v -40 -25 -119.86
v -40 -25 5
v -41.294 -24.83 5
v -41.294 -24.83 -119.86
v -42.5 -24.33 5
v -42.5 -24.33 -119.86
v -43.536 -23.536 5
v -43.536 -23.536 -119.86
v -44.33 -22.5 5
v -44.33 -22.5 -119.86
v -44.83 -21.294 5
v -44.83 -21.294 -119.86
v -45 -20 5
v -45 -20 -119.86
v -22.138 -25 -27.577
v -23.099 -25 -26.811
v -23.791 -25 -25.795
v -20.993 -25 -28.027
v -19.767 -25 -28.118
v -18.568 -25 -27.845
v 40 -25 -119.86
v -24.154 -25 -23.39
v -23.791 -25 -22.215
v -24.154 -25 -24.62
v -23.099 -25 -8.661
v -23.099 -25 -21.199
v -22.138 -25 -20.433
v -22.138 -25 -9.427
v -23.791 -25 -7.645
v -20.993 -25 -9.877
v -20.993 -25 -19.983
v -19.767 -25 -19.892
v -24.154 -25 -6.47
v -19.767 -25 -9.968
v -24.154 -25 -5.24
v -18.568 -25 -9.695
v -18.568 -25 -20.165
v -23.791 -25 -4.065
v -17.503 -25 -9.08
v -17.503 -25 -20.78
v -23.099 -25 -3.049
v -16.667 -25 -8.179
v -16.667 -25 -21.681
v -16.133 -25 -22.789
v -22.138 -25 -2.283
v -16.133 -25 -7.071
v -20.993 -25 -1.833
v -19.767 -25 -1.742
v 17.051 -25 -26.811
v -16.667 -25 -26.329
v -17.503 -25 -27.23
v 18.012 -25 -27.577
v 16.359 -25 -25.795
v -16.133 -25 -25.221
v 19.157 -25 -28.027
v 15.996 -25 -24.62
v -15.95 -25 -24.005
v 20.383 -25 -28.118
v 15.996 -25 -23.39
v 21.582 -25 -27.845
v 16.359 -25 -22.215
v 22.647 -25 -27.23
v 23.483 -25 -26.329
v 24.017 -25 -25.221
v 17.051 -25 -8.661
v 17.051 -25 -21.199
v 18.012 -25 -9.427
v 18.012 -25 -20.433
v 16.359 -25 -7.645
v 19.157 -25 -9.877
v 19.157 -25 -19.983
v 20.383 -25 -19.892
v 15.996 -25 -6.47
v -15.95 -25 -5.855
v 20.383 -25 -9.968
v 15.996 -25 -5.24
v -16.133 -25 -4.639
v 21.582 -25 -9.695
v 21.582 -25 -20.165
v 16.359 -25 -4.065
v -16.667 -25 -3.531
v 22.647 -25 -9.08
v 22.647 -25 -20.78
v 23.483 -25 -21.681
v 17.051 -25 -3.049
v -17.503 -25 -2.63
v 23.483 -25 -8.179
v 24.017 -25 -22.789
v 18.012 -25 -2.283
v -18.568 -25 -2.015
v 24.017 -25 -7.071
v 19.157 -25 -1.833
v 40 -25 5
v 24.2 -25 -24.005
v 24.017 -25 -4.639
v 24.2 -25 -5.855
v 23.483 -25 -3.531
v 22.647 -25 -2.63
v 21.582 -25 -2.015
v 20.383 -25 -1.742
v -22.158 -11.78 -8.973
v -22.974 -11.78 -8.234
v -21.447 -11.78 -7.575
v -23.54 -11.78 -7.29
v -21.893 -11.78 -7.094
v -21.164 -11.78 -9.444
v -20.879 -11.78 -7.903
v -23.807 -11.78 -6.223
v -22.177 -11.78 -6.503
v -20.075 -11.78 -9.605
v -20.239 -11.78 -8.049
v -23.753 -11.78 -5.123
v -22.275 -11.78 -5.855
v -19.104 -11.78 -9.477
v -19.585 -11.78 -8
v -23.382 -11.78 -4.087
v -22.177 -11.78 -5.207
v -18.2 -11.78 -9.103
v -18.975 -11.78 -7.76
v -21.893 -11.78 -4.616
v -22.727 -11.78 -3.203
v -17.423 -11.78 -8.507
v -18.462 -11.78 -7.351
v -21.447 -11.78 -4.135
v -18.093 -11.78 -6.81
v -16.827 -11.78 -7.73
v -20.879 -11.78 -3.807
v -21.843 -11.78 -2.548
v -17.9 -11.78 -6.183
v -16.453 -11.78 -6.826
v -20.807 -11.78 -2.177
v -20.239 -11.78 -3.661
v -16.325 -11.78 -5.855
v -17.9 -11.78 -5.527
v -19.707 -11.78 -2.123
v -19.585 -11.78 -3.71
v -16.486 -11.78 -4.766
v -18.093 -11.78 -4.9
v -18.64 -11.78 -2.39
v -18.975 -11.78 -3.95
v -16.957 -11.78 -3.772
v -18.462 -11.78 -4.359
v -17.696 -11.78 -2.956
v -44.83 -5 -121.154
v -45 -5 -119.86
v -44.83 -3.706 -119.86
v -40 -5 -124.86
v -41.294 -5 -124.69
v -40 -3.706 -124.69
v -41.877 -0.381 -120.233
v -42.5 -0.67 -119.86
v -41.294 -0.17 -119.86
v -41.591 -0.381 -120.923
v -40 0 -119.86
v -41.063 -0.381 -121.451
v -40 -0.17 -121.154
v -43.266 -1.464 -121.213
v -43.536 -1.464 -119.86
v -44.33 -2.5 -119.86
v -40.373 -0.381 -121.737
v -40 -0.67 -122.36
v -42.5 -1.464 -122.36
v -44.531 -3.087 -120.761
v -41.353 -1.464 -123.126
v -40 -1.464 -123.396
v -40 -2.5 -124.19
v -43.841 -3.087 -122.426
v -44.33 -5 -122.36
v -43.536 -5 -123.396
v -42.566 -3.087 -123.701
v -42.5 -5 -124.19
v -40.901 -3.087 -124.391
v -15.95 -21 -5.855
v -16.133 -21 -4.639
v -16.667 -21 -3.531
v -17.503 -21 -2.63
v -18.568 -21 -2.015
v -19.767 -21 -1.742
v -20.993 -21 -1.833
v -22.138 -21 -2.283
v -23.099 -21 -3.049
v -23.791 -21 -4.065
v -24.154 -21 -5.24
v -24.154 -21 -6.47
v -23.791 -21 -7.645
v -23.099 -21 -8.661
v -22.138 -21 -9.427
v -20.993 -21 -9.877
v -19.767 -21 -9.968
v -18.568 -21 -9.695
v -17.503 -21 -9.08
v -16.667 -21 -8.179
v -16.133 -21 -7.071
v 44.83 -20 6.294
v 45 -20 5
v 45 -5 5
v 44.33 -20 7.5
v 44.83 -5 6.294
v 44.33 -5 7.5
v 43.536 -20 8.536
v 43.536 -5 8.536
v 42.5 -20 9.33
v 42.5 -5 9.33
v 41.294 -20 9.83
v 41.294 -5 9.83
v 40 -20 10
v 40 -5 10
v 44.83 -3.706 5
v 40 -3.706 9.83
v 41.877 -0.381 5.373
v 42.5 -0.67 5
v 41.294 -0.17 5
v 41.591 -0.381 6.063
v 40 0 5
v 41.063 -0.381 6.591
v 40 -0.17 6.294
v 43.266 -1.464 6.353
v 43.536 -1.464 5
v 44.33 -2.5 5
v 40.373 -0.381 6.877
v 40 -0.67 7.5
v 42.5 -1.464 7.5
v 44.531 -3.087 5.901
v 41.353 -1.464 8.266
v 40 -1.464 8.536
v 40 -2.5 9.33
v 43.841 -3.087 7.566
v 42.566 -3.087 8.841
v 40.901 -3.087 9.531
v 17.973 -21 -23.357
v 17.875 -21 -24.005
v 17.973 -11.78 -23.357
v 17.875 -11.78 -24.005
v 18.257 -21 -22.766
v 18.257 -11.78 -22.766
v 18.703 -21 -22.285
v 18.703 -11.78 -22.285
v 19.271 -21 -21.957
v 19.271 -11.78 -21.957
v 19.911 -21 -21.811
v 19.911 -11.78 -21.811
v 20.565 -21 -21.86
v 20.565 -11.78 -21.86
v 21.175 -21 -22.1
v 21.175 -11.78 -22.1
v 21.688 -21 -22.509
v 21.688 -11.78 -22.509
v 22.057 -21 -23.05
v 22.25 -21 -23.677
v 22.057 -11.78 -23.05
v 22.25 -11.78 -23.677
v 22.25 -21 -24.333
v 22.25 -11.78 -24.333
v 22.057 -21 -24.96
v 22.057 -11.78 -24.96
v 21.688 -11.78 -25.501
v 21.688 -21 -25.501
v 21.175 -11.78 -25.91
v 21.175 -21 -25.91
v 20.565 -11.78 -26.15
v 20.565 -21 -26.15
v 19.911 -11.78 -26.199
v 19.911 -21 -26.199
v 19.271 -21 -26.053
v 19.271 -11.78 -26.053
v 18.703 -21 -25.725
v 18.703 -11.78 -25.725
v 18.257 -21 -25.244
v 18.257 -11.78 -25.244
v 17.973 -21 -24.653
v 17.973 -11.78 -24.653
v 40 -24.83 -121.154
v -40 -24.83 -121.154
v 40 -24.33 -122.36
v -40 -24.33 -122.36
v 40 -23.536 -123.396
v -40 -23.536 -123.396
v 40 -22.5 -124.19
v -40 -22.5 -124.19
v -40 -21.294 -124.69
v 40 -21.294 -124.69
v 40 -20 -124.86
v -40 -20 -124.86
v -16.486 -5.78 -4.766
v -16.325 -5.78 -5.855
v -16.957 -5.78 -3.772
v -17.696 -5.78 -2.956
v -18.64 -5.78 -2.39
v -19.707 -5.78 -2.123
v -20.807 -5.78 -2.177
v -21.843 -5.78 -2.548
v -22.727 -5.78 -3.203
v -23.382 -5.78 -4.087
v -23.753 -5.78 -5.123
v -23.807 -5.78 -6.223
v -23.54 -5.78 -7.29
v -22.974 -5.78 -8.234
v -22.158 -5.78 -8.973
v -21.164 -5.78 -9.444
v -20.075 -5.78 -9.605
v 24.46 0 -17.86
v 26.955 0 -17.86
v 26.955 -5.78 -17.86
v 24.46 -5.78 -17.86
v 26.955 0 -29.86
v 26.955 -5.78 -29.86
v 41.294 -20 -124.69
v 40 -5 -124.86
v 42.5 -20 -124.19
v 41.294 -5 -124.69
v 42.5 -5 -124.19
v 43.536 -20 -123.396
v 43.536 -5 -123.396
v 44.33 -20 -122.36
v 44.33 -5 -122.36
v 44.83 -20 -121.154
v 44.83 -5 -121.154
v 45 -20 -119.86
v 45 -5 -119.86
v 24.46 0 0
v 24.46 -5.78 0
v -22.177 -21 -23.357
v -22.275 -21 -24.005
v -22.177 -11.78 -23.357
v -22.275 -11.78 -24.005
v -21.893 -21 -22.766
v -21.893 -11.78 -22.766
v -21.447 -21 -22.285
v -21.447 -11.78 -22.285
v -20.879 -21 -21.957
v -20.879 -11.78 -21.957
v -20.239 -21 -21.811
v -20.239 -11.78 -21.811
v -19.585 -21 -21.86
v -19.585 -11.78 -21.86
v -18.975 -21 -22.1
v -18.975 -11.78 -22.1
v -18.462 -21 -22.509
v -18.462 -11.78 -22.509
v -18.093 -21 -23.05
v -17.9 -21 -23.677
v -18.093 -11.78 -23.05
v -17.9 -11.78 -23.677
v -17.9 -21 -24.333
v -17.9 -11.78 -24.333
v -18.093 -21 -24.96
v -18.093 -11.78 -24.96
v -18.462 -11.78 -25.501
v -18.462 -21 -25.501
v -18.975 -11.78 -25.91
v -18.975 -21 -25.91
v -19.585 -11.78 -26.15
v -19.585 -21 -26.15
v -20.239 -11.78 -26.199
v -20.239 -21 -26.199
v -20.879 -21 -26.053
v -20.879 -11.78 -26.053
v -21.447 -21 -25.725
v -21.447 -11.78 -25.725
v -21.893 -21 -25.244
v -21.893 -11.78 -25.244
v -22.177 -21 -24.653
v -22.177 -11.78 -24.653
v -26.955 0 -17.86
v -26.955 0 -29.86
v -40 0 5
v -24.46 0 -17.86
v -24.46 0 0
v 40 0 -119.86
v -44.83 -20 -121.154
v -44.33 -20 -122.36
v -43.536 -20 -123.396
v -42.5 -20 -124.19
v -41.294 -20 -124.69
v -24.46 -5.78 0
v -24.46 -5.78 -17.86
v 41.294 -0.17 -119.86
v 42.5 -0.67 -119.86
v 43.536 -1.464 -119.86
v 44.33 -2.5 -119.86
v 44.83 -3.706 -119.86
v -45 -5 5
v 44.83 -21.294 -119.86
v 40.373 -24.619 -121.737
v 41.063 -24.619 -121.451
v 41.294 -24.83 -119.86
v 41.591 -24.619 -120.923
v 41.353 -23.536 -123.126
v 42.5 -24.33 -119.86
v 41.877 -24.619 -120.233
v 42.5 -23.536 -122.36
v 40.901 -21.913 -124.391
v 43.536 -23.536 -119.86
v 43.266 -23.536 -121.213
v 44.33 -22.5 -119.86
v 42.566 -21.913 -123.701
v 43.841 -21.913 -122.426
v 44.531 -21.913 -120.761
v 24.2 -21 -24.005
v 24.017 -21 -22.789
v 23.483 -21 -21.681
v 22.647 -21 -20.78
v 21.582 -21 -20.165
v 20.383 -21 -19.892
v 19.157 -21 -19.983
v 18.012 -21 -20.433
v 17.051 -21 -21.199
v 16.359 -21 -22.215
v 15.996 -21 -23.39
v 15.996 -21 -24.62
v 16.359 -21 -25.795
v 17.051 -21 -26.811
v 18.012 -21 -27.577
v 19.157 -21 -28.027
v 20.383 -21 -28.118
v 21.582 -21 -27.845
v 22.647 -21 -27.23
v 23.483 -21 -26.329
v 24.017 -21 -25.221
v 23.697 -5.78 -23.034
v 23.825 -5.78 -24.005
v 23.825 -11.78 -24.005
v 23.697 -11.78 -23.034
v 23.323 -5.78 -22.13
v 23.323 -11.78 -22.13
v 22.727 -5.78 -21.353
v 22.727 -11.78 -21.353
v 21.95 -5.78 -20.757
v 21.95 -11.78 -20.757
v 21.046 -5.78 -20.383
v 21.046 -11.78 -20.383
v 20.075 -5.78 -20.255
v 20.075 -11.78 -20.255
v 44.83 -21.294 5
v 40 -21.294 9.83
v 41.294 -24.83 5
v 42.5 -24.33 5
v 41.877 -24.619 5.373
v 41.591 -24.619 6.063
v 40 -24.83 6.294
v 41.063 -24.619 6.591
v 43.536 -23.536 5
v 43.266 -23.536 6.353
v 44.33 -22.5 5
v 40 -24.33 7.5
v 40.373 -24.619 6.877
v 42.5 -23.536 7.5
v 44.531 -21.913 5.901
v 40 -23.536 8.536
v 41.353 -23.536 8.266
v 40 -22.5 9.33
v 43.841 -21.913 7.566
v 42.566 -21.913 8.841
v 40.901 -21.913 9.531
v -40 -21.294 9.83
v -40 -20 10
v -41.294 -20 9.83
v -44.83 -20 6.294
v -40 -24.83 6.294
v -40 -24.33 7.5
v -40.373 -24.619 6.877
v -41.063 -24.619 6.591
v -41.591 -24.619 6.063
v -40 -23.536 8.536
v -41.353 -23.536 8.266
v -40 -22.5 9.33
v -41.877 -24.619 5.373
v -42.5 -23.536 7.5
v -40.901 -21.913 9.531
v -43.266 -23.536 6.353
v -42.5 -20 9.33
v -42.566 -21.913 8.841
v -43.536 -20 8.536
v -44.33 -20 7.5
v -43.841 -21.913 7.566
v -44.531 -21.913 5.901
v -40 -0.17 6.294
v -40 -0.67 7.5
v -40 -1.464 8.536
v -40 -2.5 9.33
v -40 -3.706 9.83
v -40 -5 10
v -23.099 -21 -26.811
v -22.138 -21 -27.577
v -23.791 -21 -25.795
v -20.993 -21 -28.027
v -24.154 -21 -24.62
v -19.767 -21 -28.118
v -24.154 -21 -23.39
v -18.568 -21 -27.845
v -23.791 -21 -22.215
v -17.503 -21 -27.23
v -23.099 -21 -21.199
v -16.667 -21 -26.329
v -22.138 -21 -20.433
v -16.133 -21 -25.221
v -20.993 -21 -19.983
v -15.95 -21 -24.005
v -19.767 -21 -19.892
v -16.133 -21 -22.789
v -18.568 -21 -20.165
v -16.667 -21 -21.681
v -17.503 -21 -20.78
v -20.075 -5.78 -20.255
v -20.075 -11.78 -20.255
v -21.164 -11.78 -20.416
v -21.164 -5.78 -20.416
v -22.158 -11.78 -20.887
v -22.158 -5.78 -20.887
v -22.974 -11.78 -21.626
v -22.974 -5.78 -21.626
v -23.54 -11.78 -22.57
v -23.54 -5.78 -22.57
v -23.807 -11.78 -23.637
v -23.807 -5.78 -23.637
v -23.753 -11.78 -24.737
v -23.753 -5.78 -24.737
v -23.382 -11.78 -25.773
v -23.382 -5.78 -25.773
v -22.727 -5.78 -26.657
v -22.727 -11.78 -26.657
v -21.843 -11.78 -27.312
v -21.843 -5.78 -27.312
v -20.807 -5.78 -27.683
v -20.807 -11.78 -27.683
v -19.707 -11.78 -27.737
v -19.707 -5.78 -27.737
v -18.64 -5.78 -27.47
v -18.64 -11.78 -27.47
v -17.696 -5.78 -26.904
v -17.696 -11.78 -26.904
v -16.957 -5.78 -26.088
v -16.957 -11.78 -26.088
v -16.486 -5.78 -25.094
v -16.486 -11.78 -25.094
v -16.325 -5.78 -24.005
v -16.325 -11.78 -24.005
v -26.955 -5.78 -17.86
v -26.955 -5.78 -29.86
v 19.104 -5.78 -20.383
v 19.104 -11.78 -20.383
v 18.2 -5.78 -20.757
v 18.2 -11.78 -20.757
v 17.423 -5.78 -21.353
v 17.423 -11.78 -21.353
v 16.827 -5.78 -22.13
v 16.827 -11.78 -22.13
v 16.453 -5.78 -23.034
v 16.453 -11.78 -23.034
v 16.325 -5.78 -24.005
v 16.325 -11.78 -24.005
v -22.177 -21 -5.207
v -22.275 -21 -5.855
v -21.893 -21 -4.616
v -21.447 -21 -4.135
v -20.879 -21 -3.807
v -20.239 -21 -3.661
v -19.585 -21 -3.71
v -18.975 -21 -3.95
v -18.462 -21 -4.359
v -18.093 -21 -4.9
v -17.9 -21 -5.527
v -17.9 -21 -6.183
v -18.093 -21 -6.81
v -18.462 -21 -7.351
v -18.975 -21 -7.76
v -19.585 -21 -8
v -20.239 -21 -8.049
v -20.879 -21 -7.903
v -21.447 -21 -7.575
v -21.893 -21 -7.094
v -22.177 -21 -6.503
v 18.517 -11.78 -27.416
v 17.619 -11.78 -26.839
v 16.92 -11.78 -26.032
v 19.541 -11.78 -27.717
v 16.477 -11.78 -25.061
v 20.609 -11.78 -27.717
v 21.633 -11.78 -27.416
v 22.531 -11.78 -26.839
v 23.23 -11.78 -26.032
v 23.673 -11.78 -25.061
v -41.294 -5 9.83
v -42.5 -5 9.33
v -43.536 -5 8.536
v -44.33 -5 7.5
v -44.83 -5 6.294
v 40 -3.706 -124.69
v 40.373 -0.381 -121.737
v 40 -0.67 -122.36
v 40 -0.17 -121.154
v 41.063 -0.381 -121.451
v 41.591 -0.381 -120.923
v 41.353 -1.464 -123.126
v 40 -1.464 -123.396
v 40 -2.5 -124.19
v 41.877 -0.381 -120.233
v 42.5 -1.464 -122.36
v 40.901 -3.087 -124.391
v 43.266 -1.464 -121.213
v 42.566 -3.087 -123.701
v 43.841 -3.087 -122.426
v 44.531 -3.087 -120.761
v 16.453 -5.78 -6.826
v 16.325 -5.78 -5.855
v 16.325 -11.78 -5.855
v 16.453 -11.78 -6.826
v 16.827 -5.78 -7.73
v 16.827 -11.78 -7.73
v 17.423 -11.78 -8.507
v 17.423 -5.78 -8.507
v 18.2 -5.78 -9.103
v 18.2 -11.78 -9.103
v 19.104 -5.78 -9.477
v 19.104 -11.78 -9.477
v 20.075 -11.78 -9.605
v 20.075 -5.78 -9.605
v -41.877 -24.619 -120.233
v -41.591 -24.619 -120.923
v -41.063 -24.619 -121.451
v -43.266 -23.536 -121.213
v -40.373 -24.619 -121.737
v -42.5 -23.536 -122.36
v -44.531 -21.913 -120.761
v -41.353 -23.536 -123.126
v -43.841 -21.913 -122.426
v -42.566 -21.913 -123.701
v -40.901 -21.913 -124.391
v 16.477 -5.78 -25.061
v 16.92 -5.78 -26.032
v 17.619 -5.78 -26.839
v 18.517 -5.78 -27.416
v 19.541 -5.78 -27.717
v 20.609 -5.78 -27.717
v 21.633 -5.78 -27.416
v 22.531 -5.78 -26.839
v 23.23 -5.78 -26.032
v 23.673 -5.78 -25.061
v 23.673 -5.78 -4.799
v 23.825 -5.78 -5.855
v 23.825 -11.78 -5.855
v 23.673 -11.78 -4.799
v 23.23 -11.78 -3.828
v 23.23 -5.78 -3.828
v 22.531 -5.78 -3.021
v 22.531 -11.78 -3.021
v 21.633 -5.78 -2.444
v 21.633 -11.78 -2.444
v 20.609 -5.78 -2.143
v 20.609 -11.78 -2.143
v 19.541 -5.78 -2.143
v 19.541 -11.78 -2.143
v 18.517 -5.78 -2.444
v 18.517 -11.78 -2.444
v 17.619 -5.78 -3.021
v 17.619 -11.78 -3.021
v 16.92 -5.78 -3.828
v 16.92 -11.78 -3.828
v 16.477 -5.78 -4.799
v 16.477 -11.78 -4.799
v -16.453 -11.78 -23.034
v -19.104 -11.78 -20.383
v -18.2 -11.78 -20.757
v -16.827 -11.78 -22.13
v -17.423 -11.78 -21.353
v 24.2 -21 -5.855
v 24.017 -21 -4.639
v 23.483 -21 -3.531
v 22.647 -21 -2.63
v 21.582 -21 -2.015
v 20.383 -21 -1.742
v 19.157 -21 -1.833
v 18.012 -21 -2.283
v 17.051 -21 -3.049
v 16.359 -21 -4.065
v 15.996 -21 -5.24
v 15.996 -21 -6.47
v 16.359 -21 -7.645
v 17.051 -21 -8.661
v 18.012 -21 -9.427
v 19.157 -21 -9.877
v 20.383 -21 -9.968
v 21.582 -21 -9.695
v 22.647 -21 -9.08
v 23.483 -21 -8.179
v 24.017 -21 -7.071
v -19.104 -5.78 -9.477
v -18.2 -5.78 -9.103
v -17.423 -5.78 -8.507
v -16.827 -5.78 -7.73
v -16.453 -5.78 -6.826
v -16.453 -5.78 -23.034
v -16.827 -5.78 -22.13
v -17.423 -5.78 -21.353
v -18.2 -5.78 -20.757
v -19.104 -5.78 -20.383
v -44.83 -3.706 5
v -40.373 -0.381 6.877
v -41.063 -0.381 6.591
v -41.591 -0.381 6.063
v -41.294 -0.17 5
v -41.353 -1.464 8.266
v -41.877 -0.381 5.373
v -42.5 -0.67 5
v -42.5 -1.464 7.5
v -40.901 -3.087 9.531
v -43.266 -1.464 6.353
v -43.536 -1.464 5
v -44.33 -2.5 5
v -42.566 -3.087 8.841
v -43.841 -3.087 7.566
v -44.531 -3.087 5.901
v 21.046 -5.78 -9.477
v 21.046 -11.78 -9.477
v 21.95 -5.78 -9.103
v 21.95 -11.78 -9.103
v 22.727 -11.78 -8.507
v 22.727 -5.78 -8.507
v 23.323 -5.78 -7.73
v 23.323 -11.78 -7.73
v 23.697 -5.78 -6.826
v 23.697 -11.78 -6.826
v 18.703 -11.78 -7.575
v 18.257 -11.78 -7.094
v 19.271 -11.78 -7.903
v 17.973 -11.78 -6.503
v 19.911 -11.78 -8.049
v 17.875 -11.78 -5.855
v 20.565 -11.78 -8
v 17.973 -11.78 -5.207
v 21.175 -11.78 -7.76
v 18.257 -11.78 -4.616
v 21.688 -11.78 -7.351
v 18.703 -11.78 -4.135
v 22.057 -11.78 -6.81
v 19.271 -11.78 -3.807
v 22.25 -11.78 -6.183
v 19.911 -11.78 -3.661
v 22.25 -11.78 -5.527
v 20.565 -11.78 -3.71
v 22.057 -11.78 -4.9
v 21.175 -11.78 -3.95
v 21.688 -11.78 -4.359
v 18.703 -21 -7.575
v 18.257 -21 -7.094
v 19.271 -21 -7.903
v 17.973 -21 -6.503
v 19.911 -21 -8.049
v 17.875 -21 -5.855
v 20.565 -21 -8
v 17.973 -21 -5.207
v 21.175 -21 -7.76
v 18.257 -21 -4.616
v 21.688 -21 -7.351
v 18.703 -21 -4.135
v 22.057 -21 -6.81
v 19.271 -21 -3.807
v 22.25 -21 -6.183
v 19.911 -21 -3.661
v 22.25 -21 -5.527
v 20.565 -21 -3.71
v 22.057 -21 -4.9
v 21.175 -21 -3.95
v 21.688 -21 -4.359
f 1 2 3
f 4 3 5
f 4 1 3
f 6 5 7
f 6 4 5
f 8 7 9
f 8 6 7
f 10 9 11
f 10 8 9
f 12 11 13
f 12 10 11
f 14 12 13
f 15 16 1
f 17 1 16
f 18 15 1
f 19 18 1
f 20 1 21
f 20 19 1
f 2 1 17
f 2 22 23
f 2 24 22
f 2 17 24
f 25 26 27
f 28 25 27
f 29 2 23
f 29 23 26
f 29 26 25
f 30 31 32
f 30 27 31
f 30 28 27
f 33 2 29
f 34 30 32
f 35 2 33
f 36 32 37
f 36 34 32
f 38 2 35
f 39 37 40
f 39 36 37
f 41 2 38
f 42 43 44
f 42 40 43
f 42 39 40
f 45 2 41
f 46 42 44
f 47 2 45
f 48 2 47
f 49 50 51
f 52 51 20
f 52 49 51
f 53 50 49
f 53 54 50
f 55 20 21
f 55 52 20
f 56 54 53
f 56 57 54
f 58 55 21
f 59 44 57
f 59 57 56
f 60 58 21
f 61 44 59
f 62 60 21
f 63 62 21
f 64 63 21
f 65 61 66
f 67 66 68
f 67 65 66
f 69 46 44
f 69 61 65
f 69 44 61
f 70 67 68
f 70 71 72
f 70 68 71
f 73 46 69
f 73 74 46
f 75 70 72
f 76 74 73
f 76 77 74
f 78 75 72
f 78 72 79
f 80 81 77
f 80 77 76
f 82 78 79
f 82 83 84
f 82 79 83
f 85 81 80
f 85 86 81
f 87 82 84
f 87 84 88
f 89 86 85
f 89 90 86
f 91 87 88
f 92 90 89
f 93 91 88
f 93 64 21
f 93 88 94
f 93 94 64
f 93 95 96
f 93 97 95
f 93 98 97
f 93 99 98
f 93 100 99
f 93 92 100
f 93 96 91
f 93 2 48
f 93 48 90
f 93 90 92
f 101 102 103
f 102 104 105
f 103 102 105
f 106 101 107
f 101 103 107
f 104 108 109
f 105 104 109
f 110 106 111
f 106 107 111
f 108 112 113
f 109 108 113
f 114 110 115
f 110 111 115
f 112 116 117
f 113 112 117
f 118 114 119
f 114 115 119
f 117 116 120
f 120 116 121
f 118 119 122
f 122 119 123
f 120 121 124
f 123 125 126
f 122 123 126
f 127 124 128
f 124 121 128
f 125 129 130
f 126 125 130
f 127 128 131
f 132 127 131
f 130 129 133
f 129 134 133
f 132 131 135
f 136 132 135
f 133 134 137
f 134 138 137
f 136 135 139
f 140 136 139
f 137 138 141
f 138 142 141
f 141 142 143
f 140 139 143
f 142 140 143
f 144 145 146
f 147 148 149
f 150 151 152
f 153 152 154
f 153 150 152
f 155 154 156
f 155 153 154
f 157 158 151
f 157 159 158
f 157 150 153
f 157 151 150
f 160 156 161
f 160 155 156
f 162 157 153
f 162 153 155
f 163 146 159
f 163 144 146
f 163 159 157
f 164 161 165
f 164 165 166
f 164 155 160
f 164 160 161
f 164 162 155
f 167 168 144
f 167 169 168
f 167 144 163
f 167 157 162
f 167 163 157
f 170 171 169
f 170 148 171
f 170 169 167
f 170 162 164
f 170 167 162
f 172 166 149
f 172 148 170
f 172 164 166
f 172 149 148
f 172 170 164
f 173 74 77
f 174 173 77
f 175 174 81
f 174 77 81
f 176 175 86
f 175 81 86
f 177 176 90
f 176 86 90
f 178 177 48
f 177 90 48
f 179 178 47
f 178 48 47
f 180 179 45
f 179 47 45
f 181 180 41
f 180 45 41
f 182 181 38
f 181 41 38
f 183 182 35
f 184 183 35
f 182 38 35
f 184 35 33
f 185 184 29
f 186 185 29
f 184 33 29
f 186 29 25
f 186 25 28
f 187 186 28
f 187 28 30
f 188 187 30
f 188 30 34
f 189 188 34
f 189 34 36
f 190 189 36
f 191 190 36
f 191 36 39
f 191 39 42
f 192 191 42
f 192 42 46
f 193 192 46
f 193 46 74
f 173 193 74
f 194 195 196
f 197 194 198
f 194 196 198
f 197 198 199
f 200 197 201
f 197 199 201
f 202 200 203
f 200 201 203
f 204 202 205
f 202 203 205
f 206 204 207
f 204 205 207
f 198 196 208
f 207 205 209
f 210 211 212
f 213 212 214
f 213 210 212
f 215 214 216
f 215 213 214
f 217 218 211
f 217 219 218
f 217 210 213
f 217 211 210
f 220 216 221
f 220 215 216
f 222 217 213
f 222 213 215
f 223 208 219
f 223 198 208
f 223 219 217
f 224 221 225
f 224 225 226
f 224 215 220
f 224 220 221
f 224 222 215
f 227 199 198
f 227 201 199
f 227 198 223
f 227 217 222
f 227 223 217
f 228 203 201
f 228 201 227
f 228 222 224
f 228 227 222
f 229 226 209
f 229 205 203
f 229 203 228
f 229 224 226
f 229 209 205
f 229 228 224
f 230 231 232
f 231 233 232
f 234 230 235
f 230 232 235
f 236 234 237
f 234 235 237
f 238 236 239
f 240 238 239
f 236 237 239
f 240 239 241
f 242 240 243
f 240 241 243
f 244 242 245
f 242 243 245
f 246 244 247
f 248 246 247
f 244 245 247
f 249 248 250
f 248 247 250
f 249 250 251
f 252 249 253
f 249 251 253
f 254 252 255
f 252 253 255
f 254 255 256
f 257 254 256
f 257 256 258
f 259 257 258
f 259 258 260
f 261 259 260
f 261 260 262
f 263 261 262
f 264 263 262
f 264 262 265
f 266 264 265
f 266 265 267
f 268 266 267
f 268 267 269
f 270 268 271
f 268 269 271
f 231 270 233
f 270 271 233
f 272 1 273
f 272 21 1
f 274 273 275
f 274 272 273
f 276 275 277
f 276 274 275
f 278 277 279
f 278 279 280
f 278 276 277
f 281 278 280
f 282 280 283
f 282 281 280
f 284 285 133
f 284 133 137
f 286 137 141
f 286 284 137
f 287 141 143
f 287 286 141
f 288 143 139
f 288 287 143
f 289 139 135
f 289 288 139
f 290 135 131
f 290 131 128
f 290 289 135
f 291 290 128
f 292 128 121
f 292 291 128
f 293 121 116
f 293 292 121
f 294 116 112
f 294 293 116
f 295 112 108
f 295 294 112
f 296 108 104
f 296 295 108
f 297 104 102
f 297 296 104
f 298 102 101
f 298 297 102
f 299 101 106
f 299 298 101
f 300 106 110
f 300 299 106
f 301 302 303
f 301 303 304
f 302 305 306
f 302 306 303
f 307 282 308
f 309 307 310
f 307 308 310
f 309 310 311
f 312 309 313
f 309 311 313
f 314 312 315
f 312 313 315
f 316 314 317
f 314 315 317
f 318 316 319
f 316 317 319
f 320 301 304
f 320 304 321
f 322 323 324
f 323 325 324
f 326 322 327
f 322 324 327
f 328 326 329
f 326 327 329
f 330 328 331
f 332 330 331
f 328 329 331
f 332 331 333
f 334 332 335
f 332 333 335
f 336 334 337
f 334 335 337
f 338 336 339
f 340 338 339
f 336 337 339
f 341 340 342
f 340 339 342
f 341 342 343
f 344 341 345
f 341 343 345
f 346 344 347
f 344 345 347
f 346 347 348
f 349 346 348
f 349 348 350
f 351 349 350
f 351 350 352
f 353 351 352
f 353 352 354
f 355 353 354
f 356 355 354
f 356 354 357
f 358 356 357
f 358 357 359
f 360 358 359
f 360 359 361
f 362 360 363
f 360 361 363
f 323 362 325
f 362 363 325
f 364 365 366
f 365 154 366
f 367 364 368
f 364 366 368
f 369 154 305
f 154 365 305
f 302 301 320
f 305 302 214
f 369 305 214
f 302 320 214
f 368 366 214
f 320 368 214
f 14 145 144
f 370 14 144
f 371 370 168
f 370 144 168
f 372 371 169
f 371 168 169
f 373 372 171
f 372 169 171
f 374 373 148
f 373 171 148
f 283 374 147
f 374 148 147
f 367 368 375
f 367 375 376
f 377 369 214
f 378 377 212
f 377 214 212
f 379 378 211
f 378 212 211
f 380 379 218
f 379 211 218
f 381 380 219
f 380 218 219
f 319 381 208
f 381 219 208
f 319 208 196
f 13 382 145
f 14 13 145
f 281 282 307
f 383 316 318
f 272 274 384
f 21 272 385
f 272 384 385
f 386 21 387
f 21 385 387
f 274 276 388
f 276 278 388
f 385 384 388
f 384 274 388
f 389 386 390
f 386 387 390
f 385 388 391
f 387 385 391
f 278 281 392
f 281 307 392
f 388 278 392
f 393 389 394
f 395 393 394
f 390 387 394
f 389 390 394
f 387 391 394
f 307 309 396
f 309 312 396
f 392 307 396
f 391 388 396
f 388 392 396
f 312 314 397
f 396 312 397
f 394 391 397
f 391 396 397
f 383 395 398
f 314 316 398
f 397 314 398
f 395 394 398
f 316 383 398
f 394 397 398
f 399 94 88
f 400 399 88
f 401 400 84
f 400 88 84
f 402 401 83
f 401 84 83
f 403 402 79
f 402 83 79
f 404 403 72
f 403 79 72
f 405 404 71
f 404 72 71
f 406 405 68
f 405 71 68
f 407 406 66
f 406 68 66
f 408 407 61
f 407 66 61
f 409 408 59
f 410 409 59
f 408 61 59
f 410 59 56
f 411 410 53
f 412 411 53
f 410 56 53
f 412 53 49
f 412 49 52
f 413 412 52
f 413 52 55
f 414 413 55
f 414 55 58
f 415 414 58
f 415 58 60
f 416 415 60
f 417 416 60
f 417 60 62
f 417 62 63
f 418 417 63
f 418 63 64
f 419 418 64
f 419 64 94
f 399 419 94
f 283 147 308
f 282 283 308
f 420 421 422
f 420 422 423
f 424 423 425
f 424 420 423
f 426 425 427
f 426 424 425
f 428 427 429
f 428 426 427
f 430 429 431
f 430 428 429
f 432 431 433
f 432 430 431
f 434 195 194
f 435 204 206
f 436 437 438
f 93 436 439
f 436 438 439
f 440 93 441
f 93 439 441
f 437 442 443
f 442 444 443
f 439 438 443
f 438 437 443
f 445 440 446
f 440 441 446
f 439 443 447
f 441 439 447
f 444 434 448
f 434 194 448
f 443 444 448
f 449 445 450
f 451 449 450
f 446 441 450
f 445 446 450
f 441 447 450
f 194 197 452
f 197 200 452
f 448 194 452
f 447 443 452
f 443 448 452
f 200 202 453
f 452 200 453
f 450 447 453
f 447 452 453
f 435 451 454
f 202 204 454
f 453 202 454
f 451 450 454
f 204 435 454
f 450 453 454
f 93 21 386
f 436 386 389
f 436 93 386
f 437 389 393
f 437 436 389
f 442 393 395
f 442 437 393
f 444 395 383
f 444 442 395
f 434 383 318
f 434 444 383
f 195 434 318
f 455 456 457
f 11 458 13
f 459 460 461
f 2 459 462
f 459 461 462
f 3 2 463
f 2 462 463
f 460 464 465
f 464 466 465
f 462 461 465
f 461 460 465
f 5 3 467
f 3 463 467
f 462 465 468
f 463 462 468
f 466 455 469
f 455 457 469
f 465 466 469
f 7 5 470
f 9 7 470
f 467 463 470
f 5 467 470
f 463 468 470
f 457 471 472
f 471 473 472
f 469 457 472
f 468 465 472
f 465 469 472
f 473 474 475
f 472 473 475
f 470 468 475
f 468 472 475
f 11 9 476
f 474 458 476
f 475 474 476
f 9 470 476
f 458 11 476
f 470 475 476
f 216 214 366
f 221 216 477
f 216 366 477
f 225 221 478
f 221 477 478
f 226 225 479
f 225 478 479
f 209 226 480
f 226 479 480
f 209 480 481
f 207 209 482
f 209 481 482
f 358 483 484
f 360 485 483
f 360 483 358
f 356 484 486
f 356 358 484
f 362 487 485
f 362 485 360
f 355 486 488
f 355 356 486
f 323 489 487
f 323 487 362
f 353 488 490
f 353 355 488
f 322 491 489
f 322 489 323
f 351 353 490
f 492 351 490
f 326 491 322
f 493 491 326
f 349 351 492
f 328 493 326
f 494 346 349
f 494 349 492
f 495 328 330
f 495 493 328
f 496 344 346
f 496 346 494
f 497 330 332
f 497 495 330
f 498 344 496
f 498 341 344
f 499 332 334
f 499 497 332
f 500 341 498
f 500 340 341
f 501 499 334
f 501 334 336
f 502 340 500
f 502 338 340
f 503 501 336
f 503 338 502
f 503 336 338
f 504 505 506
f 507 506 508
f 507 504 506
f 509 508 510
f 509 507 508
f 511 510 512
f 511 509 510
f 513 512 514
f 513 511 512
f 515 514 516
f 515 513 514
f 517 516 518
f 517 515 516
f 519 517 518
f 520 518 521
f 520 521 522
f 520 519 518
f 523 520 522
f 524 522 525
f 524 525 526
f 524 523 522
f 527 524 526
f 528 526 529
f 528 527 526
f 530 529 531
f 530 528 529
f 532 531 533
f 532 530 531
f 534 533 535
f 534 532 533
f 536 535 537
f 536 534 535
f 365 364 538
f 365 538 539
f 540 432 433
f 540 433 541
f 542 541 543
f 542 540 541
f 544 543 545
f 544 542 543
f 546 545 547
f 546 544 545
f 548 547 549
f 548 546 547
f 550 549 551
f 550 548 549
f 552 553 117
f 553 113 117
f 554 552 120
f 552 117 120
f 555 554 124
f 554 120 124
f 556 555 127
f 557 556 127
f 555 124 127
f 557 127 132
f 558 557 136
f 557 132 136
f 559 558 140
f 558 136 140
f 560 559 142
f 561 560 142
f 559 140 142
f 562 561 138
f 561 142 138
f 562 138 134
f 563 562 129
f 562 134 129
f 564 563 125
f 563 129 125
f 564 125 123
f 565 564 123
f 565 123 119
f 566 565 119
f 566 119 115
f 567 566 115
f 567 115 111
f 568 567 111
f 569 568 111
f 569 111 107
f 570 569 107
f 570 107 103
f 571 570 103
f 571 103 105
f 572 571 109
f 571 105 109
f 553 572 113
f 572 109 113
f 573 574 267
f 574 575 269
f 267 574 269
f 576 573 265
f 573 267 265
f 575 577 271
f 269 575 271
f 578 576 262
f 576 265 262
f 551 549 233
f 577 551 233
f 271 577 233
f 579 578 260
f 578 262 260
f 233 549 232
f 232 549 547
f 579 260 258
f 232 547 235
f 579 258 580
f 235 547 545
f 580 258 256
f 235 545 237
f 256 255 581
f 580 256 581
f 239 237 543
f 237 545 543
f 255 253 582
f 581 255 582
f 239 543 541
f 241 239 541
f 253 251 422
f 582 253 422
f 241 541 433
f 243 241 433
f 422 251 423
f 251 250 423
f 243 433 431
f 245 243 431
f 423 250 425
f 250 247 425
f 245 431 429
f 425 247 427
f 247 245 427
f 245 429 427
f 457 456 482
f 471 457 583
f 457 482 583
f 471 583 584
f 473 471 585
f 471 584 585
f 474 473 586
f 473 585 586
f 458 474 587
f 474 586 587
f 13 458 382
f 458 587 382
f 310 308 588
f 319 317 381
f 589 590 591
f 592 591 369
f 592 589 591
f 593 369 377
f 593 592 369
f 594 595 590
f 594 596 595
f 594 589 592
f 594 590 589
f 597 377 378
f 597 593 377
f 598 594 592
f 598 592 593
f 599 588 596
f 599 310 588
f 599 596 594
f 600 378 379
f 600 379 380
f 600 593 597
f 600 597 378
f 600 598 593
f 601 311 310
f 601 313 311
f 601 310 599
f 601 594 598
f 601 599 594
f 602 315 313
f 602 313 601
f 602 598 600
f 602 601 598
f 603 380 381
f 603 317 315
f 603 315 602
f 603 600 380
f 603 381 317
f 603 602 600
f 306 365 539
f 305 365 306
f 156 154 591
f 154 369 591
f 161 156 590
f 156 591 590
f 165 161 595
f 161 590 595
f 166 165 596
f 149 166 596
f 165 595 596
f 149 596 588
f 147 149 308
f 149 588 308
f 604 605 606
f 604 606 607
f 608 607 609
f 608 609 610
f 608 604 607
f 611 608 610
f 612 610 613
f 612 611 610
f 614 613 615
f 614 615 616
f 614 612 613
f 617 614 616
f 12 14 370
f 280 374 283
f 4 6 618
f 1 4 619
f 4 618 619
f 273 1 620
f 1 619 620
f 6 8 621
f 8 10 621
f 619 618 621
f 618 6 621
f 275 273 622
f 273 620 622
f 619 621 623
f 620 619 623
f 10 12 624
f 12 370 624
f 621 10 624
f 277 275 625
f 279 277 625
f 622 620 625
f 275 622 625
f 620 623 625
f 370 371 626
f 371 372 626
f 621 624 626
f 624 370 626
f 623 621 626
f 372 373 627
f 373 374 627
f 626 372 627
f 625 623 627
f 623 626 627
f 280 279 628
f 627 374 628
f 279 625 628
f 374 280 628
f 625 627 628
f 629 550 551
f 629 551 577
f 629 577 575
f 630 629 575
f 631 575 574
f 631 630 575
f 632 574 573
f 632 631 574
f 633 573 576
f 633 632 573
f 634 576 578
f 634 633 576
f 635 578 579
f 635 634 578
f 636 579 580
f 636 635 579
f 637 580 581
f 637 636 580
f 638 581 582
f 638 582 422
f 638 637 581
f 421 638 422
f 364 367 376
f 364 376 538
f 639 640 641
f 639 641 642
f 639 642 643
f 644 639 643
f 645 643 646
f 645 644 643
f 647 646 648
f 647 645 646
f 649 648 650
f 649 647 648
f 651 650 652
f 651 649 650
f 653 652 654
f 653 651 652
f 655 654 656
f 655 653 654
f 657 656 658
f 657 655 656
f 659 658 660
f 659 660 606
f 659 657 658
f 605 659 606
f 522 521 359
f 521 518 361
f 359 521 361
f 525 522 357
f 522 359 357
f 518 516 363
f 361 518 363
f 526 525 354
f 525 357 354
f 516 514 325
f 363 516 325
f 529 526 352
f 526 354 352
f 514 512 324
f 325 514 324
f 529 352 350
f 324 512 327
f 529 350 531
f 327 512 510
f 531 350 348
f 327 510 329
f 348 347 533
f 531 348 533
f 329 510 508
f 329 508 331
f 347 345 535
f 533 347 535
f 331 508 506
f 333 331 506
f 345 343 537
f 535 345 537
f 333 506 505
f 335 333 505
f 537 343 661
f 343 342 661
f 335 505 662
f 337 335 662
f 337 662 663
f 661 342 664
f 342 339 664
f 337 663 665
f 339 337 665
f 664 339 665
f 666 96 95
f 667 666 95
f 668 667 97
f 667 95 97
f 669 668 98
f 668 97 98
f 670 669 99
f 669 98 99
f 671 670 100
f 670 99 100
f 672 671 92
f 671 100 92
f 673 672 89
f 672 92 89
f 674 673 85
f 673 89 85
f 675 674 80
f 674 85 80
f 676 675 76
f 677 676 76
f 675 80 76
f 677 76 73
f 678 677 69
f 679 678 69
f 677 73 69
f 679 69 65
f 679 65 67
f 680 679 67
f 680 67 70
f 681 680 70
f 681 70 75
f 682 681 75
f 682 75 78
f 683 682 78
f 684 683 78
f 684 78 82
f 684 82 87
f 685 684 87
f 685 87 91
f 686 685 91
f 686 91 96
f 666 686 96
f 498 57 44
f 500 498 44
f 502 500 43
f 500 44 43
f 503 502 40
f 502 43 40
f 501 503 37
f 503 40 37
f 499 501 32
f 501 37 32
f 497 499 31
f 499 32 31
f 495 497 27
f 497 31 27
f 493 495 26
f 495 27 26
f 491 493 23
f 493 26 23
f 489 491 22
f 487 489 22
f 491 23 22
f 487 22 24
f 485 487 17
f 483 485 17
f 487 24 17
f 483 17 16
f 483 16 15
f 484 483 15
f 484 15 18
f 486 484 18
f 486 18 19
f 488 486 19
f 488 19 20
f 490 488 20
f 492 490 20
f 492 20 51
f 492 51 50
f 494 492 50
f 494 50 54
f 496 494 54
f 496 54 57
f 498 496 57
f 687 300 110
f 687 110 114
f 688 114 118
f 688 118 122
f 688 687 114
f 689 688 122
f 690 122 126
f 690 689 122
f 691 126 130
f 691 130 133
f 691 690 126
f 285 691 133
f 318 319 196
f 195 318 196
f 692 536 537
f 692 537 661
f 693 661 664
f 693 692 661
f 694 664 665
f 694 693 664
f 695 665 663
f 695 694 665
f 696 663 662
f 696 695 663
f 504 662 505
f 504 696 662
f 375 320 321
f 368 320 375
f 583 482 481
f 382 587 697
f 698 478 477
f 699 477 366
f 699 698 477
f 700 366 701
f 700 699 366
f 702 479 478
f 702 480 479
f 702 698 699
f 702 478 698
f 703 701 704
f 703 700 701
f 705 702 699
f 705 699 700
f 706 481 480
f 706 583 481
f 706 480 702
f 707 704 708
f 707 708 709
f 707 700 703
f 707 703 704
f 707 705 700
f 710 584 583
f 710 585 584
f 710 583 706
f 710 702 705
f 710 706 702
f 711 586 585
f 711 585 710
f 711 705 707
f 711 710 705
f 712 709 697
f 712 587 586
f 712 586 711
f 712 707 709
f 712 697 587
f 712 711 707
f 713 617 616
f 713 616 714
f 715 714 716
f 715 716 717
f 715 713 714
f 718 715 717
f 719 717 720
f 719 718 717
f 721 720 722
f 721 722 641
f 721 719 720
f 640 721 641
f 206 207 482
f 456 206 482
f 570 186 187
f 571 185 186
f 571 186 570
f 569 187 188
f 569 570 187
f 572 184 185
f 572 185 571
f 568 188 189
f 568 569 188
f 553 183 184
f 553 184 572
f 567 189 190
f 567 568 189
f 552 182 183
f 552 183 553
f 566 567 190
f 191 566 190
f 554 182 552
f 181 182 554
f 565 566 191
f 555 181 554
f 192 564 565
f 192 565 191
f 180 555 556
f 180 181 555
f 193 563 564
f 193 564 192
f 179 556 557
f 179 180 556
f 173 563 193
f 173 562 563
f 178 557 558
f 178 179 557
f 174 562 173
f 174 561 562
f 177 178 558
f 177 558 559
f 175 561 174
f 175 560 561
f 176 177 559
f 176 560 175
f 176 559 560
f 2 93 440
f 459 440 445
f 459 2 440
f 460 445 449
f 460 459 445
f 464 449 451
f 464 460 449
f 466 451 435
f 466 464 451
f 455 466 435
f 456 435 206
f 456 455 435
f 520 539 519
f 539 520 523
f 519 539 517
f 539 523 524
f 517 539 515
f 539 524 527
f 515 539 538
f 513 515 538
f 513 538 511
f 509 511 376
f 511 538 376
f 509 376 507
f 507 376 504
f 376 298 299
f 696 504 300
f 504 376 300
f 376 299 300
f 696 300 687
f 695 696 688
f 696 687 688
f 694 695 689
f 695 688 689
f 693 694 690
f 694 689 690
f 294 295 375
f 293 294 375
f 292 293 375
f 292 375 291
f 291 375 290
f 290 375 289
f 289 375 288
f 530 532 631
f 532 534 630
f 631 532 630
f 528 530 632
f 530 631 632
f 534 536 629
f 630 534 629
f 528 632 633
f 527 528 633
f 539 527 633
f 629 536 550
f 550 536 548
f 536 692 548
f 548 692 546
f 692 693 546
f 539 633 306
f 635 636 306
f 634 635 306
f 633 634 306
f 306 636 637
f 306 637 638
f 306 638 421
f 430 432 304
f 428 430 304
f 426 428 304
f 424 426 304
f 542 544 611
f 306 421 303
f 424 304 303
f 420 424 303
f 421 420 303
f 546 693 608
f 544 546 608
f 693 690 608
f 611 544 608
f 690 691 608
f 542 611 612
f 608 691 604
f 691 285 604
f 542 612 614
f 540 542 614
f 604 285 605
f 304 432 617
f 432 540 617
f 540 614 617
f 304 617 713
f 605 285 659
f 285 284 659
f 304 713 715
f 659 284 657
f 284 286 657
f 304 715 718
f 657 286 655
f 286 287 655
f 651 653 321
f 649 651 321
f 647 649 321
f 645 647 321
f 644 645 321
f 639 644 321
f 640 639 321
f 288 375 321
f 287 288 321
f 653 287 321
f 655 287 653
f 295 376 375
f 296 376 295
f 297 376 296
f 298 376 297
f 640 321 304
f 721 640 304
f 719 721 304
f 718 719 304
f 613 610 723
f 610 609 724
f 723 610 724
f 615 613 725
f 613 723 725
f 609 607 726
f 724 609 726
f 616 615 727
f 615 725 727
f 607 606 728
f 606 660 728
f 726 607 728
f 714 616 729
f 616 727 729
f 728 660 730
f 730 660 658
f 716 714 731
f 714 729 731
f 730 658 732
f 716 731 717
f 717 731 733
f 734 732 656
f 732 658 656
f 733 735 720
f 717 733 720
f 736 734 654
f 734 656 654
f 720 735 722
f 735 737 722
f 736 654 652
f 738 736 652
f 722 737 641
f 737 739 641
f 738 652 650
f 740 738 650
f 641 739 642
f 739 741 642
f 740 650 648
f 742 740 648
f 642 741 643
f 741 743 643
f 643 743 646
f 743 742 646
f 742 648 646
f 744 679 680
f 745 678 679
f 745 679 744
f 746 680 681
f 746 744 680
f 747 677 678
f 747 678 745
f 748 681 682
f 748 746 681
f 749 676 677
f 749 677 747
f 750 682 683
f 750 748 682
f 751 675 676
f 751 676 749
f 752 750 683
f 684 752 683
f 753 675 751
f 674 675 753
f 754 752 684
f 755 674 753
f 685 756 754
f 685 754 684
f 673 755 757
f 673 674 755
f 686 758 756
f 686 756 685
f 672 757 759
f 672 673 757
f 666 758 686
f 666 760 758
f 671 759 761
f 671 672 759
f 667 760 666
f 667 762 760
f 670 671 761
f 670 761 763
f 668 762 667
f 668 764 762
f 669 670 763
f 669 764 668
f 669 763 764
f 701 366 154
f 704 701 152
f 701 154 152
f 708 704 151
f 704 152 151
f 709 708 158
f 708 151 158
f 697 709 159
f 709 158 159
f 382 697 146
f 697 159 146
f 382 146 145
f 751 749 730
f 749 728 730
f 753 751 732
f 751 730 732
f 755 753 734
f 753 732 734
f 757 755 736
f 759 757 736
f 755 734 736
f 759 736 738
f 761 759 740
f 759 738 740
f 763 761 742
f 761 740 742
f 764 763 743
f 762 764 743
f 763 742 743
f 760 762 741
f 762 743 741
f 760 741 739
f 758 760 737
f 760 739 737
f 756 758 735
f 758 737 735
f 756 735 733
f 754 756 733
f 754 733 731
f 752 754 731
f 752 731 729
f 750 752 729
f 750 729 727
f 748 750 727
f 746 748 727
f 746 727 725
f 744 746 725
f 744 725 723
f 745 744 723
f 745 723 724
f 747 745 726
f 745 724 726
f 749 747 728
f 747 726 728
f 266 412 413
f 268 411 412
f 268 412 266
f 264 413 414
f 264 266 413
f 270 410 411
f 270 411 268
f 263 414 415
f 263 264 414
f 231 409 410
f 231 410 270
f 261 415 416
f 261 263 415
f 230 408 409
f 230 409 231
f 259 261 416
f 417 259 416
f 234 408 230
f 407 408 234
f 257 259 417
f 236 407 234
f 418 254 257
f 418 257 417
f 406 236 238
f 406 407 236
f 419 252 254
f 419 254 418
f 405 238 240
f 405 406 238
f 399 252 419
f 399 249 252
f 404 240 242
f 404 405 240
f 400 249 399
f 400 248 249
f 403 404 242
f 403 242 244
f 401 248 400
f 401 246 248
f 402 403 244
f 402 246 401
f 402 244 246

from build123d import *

# Parameters (mm, degrees)
F1_DEPTH       = 25
F3_DEPTH       = 5.78
F4_DEPTH       = 11.78
F5_R           = 5
F6_R           = 5
F8_D           = 4.4
F8_CBORE_D     = 8.25
F8_CBORE_DEPTH = 4


with BuildPart() as f1:
    # F0 (on Front) → F1 (new body)
    with BuildSketch(Plane.XZ):
        with BuildLine():
            Line((40, 10), (-40, 10))
            ThreePointArc((-40, 10), (-43.5355339059, 8.5355339059), (-45, 5))
            Line((-45, 5), (-45, -119.86))
            ThreePointArc((-45, -119.86), (-43.5355339059, -123.3955339059), (-40, -124.86))
            Line((-40, -124.86), (40, -124.86))
            ThreePointArc((40, -124.86), (43.5355339059, -123.3955339059), (45, -119.86))
            Line((45, -119.86), (45, 5))
            ThreePointArc((45, 5), (43.5355339059, 8.5355339059), (40, 10))
        make_face()
    extrude(amount=F1_DEPTH)

    # F2 (on Front) → F3 (cut)
    with BuildSketch(Plane.XZ):
        Polygon((24.46, 0), (-24.46, 0), (-24.46, -17.86), (-26.955, -17.86), (-26.955, -29.86), (26.955, -29.86), (26.955, -17.86), (24.46, -17.86), align=None)
        with BuildLine():
            ThreePointArc((-20.075, -9.605), (-22.7266504294, -3.2033495706), (-16.325, -5.855))
            Line((-16.325, -5.855), (16.325, -5.855))
            ThreePointArc((16.325, -5.855), (20.075, -2.105), (23.825, -5.855))
            ThreePointArc((23.825, -5.855), (22.7266504294, -8.5066504294), (20.075, -9.605))
            Line((20.075, -9.605), (20.075, -20.255))
            ThreePointArc((20.075, -20.255), (22.7266504294, -21.3533495706), (23.825, -24.005))
            ThreePointArc((23.825, -24.005), (20.075, -27.755), (16.325, -24.005))
            Line((16.325, -24.005), (-16.325, -24.005))
            ThreePointArc((-16.325, -24.005), (-22.7266504294, -26.6566504294), (-20.075, -20.255))
            Line((-20.075, -20.255), (-20.075, -9.605))
        make_face(mode=Mode.SUBTRACT)
        with BuildLine():
            Line((16.325, -5.855), (-16.325, -5.855))
            ThreePointArc((-16.325, -5.855), (-17.4233495706, -8.5066504294), (-20.075, -9.605))
            Line((-20.075, -9.605), (-20.075, -20.255))
            ThreePointArc((-20.075, -20.255), (-17.4233495706, -21.3533495706), (-16.325, -24.005))
            Line((-16.325, -24.005), (16.325, -24.005))
            ThreePointArc((16.325, -24.005), (17.4233495706, -21.3533495706), (20.075, -20.255))
            Line((20.075, -20.255), (20.075, -9.605))
            ThreePointArc((20.075, -9.605), (17.4233495706, -8.5066504294), (16.325, -5.855))
        make_face()
    extrude(amount=F3_DEPTH, mode=Mode.SUBTRACT)

    # F2 (on Front) → F4 (cut, through all)
    with BuildSketch(Plane.XZ):
        with BuildLine():
            Line((-16.325, -5.855), (-18.45, -5.855))
            ThreePointArc((-18.45, -5.855), (-18.9259514806, -7.0040485194), (-20.075, -7.48))
            Line((-20.075, -7.48), (-20.075, -9.605))
            ThreePointArc((-20.075, -9.605), (-17.4233495706, -8.5066504294), (-16.325, -5.855))
        make_face()
        with BuildLine():
            Line((-18.45, -5.855), (-20.075, -5.855))
            Line((-20.075, -5.855), (-20.075, -7.48))
            ThreePointArc((-20.075, -7.48), (-18.9259514806, -7.0040485194), (-18.45, -5.855))
        make_face()
        with BuildLine():
            Line((-20.075, -7.48), (-20.075, -5.855))
            Line((-20.075, -5.855), (-18.45, -5.855))
            ThreePointArc((-18.45, -5.855), (-21.2240485194, -4.7059514806), (-20.075, -7.48))
        make_face()
        with BuildLine():
            ThreePointArc((-20.075, -7.48), (-21.2240485194, -4.7059514806), (-18.45, -5.855))
            Line((-18.45, -5.855), (-16.325, -5.855))
            ThreePointArc((-16.325, -5.855), (-22.7266504294, -3.2033495706), (-20.075, -9.605))
            Line((-20.075, -9.605), (-20.075, -7.48))
        make_face()
        with BuildLine():
            ThreePointArc((-16.325, -24.005), (-17.4233495706, -21.3533495706), (-20.075, -20.255))
            Line((-20.075, -20.255), (-20.075, -22.38))
            ThreePointArc((-20.075, -22.38), (-18.9259514806, -22.8559514806), (-18.45, -24.005))
            Line((-18.45, -24.005), (-16.325, -24.005))
        make_face()
        with BuildLine():
            ThreePointArc((-18.45, -24.005), (-18.9259514806, -22.8559514806), (-20.075, -22.38))
            Line((-20.075, -22.38), (-20.075, -24.005))
            Line((-20.075, -24.005), (-18.45, -24.005))
        make_face()
        with BuildLine():
            Line((-20.075, -22.38), (-20.075, -20.255))
            ThreePointArc((-20.075, -20.255), (-22.7266504294, -26.6566504294), (-16.325, -24.005))
            Line((-16.325, -24.005), (-18.45, -24.005))
            ThreePointArc((-18.45, -24.005), (-21.2240485194, -25.1540485194), (-20.075, -22.38))
        make_face()
        with BuildLine():
            Line((-20.075, -24.005), (-20.075, -22.38))
            ThreePointArc((-20.075, -22.38), (-21.2240485194, -25.1540485194), (-18.45, -24.005))
            Line((-18.45, -24.005), (-20.075, -24.005))
        make_face()
        with BuildLine():
            Line((18.45, -5.855), (16.325, -5.855))
            ThreePointArc((16.325, -5.855), (17.4233495706, -8.5066504294), (20.075, -9.605))
            Line((20.075, -9.605), (20.075, -7.48))
            ThreePointArc((20.075, -7.48), (18.9259514806, -7.0040485194), (18.45, -5.855))
        make_face()
        with BuildLine():
            Line((20.075, -5.855), (18.45, -5.855))
            ThreePointArc((18.45, -5.855), (18.9259514806, -7.0040485194), (20.075, -7.48))
            Line((20.075, -7.48), (20.075, -5.855))
        make_face()
        with BuildLine():
            ThreePointArc((23.825, -5.855), (20.075, -2.105), (16.325, -5.855))
            Line((16.325, -5.855), (18.45, -5.855))
            ThreePointArc((18.45, -5.855), (20.075, -4.23), (21.7, -5.855))
            ThreePointArc((21.7, -5.855), (21.2240485194, -7.0040485194), (20.075, -7.48))
            Line((20.075, -7.48), (20.075, -9.605))
            ThreePointArc((20.075, -9.605), (22.7266504294, -8.5066504294), (23.825, -5.855))
        make_face()
        with BuildLine():
            ThreePointArc((21.7, -5.855), (20.075, -4.23), (18.45, -5.855))
            Line((18.45, -5.855), (20.075, -5.855))
            Line((20.075, -5.855), (20.075, -7.48))
            ThreePointArc((20.075, -7.48), (21.2240485194, -7.0040485194), (21.7, -5.855))
        make_face()
        with BuildLine():
            Line((20.075, -22.38), (20.075, -20.255))
            ThreePointArc((20.075, -20.255), (17.4233495706, -21.3533495706), (16.325, -24.005))
            Line((16.325, -24.005), (18.45, -24.005))
            ThreePointArc((18.45, -24.005), (18.9259514806, -22.8559514806), (20.075, -22.38))
        make_face()
        with BuildLine():
            Line((20.075, -24.005), (20.075, -22.38))
            ThreePointArc((20.075, -22.38), (18.9259514806, -22.8559514806), (18.45, -24.005))
            Line((18.45, -24.005), (20.075, -24.005))
        make_face()
        with BuildLine():
            ThreePointArc((21.7, -24.005), (21.2240485194, -22.8559514806), (20.075, -22.38))
            Line((20.075, -22.38), (20.075, -24.005))
            Line((20.075, -24.005), (18.45, -24.005))
            ThreePointArc((18.45, -24.005), (20.075, -25.63), (21.7, -24.005))
        make_face()
        with BuildLine():
            ThreePointArc((23.825, -24.005), (22.7266504294, -21.3533495706), (20.075, -20.255))
            Line((20.075, -20.255), (20.075, -22.38))
            ThreePointArc((20.075, -22.38), (21.2240485194, -22.8559514806), (21.7, -24.005))
            ThreePointArc((21.7, -24.005), (20.075, -25.63), (18.45, -24.005))
            Line((18.45, -24.005), (16.325, -24.005))
            ThreePointArc((16.325, -24.005), (20.075, -27.755), (23.825, -24.005))
        make_face()
    extrude(amount=F4_DEPTH, mode=Mode.SUBTRACT)

    # F5
    f5_edges = [f1.edges().sort_by_distance(p)[0] for p in [
        (0, 0, -124.86),
        (-43.535534, 0, -123.395534),
        (43.535534, 0, -123.395534),
        (45, 0, -57.43),
        (-45, 0, -57.43),
        (0, 0, 10),
        (-43.535534, 0, 8.535534),
        (43.535534, 0, 8.535534),
    ]]
    fillet(f5_edges, radius=F5_R)

    # F6
    f6_edges = [f1.edges().sort_by_distance(p)[0] for p in [
        (0, -25, -124.86),
    ]]
    fillet(f6_edges, radius=F6_R)

    # F8 (through all)
    with Locations(Plane.XZ.offset(25)):
        with Locations((-20.075, -24.005), (-20.075, -5.855), (20.075, -5.855), (20.075, -24.005)):
            CounterBoreHole(F8_D / 2, F8_CBORE_D / 2, F8_CBORE_DEPTH)


solid = f1.part
